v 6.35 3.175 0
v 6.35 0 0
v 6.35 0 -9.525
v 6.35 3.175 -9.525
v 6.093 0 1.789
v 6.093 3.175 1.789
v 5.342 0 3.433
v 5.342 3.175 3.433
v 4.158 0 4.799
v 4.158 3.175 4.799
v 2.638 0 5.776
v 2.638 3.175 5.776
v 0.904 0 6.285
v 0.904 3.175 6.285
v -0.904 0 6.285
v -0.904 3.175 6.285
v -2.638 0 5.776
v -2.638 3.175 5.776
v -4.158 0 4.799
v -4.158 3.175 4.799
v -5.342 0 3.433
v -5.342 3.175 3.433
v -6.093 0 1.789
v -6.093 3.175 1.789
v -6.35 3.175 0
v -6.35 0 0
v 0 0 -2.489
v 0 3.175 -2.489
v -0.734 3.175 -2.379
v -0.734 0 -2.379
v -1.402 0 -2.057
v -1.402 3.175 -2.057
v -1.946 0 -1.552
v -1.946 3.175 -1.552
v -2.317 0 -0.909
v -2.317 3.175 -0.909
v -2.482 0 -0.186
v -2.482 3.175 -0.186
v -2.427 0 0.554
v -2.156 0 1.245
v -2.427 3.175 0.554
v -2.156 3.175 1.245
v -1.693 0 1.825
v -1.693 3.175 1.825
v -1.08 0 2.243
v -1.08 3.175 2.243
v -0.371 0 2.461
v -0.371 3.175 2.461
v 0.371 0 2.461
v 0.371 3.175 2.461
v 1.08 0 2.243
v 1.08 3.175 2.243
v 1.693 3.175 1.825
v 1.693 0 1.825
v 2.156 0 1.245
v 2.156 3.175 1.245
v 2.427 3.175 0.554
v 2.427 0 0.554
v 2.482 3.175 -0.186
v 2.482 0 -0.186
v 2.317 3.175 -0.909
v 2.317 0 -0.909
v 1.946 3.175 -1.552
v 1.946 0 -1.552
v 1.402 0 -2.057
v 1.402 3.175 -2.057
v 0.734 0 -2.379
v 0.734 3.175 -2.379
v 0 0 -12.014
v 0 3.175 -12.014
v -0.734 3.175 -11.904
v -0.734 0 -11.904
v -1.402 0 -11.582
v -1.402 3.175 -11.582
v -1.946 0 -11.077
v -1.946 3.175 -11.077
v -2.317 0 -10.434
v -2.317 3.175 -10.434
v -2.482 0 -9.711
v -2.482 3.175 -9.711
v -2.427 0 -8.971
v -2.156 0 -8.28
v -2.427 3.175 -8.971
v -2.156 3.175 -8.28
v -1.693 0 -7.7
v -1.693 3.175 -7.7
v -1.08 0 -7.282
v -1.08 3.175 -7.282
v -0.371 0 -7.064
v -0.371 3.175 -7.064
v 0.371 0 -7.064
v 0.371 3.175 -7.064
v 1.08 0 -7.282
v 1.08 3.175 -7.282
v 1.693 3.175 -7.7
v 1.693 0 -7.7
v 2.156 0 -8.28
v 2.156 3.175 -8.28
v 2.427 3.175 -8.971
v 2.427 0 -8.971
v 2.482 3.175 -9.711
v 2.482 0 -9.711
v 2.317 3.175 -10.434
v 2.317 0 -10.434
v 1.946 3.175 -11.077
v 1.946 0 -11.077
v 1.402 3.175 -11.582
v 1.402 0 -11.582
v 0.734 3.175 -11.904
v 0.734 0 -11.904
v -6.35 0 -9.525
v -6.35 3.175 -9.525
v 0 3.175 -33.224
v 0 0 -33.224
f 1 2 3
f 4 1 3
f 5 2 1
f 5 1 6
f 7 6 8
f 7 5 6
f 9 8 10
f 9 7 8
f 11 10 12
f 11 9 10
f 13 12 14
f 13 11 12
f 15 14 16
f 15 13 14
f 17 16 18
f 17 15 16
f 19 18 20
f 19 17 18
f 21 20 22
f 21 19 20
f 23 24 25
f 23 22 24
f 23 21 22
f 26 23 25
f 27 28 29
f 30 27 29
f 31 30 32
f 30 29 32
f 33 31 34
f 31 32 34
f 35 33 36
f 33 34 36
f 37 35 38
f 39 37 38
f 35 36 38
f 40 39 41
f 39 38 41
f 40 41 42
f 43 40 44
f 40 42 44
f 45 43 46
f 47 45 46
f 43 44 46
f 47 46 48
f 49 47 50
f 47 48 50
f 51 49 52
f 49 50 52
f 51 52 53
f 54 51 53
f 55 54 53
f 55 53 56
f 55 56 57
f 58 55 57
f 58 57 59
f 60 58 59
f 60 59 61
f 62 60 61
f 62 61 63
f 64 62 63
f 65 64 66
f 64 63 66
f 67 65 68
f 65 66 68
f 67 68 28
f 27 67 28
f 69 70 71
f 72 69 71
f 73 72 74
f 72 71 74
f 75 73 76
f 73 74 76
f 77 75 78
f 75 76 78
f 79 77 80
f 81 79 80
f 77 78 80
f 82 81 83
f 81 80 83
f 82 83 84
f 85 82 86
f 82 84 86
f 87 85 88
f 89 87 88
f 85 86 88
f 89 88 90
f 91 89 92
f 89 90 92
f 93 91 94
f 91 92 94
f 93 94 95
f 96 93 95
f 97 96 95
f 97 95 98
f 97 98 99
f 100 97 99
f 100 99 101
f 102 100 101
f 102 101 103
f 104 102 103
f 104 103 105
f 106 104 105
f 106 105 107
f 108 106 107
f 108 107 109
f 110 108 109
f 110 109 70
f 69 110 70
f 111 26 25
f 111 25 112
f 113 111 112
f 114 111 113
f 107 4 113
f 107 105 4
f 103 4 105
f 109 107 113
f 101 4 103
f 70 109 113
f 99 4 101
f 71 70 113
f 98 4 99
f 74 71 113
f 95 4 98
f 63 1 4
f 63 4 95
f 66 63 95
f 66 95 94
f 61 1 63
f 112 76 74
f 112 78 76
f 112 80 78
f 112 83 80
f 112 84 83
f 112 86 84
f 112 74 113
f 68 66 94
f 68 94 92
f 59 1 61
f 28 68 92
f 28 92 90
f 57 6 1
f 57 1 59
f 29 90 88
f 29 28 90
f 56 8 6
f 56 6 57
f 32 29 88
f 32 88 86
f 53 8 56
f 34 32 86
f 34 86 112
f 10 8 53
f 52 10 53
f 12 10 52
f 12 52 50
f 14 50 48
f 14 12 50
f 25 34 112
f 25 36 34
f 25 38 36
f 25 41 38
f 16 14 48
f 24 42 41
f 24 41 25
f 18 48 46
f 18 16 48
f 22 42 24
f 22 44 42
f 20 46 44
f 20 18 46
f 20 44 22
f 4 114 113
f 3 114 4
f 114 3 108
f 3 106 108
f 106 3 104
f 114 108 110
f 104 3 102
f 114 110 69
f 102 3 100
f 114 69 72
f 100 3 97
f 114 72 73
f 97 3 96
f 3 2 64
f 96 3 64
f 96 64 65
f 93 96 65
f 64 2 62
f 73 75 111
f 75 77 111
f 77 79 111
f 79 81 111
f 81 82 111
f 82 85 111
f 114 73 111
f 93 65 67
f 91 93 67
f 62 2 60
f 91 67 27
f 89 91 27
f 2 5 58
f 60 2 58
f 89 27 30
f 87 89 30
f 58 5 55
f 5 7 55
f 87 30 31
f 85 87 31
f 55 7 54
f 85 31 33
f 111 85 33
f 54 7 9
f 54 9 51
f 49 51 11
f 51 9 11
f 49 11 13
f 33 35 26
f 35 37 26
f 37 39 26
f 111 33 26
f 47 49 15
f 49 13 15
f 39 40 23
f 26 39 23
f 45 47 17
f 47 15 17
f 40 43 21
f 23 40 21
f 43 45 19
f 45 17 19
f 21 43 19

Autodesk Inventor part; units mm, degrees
ref_plane "YZ Plane" through (0, 0, 0) normal (1, 0, 0) x (0, 1, 0)
ref_plane "XZ Plane" through (0, 0, 0) normal (0, 1, 0) x (-1, 0, 0)
ref_plane "XY Plane" through (0, 0, 0) normal (0, 0, 1) x (1, 0, 0)
sketch "Sketch1" plane through (0, 0, 0) normal (0, 1, 0) x (-1, 0, 0)
  line L0 (0, 0) -> (0, -9.525)
  arc A0 (6.35, 0) -> (-6.35, 0) centre (0, 0) ccw
  line L1 (6.35, 0) -> (6.35, -9.525)
  line L2 (-6.35, 0) -> (-6.35, -9.525)
  line L3 (6.35, -9.525) -> (0, -33.2235)
  line L4 (0, -33.2235) -> (-6.35, -9.525)
  dimension "d0" = 9.525
  dimension "d1" = 12.7
  dimension "d13" = 165
  dimension "d14" = 9.525
  dimension "d15" = 9.525
  dimension "d16" = 165
extrude "Extrusion1" add sketch "Sketch1" along normal blind 3.175
hole "Hole1" at (0, 0, 0) at (0, 0, -9.525) direction (0, 1, 0) diameter 4.9784 end through all clearance for "Flat Head Machine Screw (82)" size "#10" standard "Ansi Unified Screw Threads"
equation "\"d1\" = thickness"
equation "\"height\" = 203.2"
equation "\"thickness\" = 12.7"
equation "\"shaftDiam\" = 6.35"
equation "\"shaftSpace\" = 1.5875"
equation "\"stageSpace\" = 2.54"
equation "\"stageAngle\" = 15deg"
equation "\"bearingDiam\" = 9.5504"
equation "\"FlangeDiam\" = 12.7"
equation "\"FlangeDepth\" = 1.5875"
equation "\"smallFilet\" = 0.39687"
equation "\"ringDiam\" = 96.46608"
equation "\"stockHeight\" = 50.8"
equation "\"stockWidth\" = 76.2"
equation "\"stockRad\" = 9.525"
equation "\"stockGuage\" = 3.175"
equation "\"groundActu\" = 304.8"
equation "\"baseWidth\" = 1066.8"
equation "\"baseDepth\" = 254"
equation "\"capThickness\" = 3.175"
equation "\"sup1Len\" = 660.4"
equation "\"sup1Ang\" = 22.619865deg"
equation "\"sup2Len\" = 2079.37366"
equation "\"sup2Ang\" = 8.959949deg"
equation "\"supVertLen\" = 955.13561"
equation "\"supSideLen\" = 1531.12879"
equation "\"supSideAng\" = 19.376933deg"
properties part number "lock ring 2 supp" material "Aluminum 6061"
